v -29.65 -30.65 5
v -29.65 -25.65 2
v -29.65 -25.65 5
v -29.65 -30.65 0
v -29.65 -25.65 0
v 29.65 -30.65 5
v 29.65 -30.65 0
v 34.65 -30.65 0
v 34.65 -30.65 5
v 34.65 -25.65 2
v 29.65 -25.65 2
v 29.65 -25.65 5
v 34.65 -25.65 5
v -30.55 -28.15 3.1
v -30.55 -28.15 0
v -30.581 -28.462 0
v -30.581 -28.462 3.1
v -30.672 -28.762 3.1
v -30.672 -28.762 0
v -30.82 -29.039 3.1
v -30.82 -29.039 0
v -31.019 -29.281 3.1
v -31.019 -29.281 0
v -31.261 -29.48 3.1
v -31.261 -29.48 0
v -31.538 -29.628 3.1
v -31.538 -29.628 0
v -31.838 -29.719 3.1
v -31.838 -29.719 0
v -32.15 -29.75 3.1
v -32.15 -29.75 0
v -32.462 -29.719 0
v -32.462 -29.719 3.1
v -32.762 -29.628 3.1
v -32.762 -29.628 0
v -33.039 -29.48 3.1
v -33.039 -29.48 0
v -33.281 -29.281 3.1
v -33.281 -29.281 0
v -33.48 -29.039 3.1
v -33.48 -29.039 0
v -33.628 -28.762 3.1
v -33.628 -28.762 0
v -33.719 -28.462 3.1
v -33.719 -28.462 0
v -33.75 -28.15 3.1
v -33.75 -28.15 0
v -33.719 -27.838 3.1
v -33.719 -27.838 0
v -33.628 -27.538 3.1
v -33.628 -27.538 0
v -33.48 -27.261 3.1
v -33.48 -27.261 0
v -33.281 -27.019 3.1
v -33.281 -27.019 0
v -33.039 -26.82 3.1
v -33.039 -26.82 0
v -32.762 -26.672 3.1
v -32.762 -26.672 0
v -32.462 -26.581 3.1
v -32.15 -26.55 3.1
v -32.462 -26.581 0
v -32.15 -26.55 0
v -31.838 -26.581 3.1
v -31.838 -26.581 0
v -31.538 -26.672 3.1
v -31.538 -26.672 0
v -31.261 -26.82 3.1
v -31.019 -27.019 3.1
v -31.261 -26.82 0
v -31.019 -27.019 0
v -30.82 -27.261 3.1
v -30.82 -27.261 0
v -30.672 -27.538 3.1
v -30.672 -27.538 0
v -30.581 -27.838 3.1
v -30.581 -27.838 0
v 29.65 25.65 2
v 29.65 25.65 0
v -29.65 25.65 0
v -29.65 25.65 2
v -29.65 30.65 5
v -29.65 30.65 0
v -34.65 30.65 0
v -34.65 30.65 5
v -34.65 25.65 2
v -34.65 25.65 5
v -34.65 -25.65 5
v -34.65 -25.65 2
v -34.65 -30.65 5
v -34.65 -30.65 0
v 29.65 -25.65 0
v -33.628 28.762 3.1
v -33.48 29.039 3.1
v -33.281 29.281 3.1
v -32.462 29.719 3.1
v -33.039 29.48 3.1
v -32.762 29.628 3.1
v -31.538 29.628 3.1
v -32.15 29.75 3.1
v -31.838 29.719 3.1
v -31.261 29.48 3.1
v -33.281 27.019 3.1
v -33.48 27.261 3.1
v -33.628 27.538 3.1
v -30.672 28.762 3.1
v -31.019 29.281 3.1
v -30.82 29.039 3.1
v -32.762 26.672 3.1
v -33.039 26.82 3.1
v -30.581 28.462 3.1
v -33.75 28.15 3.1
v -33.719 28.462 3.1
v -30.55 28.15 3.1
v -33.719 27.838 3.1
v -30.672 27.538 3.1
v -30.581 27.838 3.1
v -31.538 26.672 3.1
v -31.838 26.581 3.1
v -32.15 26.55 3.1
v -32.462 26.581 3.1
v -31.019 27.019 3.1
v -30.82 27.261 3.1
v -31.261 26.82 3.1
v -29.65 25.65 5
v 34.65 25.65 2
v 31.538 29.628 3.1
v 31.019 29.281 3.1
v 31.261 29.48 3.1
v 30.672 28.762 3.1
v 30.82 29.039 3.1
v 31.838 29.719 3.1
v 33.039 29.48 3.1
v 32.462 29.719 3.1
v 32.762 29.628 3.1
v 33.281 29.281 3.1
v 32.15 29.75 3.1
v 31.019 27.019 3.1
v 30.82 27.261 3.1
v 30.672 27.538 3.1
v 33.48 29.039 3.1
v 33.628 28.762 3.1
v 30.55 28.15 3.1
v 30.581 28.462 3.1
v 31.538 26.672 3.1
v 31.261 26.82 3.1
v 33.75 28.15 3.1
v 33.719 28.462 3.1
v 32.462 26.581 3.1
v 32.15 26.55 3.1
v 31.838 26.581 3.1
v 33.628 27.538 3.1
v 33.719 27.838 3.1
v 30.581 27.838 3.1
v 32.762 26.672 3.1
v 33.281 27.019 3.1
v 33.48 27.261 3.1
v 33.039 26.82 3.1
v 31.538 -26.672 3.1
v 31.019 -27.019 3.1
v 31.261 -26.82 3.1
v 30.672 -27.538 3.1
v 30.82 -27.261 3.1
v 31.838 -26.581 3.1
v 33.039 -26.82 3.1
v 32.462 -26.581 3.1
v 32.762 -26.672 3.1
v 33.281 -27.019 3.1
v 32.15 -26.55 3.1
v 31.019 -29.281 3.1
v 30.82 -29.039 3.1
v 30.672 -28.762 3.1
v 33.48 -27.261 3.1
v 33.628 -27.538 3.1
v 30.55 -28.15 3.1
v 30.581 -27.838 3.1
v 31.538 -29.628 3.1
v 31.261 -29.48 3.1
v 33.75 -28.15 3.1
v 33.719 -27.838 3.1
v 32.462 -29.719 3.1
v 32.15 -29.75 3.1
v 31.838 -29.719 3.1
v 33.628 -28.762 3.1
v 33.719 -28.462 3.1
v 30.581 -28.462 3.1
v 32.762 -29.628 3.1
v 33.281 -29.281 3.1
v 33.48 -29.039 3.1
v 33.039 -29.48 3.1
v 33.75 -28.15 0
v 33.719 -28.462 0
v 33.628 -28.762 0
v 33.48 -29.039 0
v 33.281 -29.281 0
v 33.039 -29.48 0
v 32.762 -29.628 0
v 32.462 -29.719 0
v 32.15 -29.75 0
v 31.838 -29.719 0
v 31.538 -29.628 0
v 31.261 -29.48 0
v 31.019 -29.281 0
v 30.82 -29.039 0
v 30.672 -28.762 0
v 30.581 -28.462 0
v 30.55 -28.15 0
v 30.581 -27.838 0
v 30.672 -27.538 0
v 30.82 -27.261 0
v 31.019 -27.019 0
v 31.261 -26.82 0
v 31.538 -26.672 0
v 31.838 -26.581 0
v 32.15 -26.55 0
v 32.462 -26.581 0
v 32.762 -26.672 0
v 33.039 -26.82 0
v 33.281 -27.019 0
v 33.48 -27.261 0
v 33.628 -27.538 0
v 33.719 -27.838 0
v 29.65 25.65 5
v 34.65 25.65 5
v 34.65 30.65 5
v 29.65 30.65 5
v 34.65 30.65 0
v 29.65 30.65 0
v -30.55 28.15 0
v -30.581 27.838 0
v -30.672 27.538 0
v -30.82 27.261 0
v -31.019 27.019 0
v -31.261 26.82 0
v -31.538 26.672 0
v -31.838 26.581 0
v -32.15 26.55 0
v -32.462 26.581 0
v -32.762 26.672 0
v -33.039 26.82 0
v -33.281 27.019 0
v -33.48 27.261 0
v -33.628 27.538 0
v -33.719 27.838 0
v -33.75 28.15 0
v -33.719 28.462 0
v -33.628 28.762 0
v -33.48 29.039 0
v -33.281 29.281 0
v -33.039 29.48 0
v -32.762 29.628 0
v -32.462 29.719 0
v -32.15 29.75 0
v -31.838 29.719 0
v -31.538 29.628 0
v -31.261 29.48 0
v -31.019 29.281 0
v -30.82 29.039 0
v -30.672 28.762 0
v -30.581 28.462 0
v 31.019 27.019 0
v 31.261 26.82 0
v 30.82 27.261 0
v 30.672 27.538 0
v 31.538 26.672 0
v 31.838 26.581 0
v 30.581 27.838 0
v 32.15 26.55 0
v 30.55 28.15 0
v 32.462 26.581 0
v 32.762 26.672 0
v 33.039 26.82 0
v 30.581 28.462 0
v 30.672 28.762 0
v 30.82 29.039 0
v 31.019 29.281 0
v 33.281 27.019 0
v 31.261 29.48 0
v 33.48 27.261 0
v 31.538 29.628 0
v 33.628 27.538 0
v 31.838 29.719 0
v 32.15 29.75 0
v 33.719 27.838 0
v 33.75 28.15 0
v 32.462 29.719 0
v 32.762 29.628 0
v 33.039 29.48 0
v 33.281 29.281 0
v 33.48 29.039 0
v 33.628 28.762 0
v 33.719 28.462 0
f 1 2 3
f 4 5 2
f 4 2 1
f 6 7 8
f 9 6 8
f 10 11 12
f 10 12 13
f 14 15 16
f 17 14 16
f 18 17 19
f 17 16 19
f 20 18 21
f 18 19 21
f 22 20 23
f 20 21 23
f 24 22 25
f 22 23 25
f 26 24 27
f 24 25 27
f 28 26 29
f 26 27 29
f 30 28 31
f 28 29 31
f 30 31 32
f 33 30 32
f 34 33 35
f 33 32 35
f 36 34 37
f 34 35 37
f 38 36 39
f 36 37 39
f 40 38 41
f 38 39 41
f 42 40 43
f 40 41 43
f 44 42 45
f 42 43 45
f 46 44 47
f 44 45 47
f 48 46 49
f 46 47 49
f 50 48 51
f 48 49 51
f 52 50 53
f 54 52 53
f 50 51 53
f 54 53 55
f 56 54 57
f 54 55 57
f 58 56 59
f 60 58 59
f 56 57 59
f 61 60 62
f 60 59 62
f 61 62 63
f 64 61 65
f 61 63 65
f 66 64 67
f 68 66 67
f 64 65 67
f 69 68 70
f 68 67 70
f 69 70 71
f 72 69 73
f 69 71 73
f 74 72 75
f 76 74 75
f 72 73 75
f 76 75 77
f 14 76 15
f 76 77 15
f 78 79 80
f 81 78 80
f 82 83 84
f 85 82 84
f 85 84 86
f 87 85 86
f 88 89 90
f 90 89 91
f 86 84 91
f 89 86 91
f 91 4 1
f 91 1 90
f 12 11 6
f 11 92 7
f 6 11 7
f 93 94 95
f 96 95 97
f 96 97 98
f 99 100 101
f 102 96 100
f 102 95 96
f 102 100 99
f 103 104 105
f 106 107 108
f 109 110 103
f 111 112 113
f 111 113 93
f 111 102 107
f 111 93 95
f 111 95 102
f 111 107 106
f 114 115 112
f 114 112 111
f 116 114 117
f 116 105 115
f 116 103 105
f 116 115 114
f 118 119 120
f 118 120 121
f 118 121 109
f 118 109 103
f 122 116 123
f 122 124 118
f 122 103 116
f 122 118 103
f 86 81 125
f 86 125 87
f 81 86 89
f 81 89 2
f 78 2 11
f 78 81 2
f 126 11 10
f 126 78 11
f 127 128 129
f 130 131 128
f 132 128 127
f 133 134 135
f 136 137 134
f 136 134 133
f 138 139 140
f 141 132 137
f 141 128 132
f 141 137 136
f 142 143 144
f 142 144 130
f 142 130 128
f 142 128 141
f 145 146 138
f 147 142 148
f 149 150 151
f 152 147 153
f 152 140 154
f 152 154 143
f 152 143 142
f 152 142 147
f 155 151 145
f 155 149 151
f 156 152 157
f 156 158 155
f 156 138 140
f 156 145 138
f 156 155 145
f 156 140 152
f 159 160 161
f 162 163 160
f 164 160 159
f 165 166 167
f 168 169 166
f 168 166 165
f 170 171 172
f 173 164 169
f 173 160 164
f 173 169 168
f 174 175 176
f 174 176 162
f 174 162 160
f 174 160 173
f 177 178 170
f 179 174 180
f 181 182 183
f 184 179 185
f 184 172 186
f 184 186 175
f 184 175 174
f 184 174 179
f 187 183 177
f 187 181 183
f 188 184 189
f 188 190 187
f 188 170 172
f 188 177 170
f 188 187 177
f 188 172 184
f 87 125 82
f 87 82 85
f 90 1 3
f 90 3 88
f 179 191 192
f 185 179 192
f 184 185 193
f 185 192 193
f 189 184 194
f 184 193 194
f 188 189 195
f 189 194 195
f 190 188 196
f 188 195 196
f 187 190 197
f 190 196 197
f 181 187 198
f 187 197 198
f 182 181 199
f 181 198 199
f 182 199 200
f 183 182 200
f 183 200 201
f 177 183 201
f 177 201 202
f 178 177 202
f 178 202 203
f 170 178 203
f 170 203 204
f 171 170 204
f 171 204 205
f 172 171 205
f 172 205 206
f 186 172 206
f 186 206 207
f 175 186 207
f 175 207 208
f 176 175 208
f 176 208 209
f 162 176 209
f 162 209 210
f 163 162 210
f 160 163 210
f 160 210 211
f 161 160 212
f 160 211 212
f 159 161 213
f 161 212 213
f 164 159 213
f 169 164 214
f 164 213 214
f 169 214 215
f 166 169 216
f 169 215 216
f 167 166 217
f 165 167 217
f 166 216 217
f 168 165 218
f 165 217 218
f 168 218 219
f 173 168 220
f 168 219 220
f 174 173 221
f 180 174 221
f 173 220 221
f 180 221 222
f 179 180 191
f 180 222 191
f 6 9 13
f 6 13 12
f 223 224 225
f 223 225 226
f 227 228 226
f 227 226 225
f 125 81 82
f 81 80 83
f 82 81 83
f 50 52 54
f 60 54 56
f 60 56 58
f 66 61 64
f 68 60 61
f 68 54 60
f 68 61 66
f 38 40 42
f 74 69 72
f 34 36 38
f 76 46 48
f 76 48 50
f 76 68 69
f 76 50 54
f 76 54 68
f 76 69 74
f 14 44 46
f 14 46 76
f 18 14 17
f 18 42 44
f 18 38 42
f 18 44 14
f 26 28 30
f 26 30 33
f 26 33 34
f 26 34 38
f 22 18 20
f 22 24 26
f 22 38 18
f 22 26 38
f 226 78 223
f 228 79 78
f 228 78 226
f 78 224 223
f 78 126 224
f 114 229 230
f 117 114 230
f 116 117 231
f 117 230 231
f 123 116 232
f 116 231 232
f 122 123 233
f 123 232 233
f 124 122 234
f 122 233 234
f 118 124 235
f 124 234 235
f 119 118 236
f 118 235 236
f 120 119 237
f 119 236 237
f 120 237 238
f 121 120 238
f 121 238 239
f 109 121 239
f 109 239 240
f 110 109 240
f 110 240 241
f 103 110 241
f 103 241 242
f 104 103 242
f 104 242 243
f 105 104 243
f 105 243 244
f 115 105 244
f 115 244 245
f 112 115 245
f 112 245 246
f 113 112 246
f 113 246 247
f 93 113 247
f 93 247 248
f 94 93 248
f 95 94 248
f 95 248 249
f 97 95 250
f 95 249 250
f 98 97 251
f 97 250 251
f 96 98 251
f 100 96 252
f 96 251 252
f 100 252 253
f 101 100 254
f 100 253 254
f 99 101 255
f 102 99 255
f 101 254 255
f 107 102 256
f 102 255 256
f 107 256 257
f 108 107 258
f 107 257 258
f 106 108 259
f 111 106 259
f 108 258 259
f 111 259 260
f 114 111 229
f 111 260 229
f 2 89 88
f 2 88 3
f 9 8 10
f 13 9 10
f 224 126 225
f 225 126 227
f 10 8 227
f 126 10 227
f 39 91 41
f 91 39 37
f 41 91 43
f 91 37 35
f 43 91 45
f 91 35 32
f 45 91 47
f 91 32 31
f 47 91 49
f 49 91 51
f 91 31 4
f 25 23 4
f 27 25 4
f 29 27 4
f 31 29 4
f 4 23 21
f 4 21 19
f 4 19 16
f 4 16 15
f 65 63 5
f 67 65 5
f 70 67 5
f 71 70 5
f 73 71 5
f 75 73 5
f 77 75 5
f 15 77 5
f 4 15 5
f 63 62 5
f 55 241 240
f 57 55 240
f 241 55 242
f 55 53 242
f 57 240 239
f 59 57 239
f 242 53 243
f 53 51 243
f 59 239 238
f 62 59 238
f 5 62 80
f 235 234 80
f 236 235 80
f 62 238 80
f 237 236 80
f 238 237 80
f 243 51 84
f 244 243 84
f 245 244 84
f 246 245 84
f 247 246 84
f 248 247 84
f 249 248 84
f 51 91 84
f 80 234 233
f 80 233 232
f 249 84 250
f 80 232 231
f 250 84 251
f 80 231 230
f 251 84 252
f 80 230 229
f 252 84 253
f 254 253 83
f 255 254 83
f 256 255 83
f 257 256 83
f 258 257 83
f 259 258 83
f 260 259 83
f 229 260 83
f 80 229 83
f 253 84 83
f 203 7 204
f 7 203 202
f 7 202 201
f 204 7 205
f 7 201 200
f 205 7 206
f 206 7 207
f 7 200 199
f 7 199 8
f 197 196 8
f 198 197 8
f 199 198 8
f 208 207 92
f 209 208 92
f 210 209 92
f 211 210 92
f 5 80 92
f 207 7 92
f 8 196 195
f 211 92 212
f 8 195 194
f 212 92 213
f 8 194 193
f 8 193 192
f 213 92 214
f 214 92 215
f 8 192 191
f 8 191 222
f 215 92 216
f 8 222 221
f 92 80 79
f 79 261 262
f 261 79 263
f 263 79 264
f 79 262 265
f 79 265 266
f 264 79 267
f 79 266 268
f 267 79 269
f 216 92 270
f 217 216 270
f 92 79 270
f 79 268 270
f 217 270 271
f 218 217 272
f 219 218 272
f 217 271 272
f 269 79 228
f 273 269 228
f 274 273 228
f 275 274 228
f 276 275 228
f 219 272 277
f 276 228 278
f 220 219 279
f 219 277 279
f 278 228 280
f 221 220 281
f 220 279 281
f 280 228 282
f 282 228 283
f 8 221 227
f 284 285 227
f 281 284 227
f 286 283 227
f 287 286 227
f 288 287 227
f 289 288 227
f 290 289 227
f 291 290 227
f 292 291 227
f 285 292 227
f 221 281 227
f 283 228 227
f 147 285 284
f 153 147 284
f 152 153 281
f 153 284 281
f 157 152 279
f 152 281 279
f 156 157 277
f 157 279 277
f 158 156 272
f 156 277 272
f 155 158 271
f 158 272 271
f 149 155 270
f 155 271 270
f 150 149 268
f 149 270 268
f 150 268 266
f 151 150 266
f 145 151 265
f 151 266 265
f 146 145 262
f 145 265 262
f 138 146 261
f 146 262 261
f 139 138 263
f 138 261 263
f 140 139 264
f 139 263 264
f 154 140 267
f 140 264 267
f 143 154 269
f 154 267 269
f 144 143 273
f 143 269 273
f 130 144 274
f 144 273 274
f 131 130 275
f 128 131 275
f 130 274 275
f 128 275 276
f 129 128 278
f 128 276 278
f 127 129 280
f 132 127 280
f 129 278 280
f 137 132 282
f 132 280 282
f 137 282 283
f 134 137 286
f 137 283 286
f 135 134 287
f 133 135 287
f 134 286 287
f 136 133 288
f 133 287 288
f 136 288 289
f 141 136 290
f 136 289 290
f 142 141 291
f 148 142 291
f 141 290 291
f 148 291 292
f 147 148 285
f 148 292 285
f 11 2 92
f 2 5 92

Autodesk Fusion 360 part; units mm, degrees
sketch "Sketch1" plane through (0, 0, 0) normal (0, 0, 1) x (1, 0, 0)
  line L0 (34.65, 25.65) -> (-34.65, 25.65)
  line L1 (-34.65, 25.65) -> (-34.65, -25.65)
  line L2 (-34.65, -25.65) -> (34.65, -25.65)
  line L3 (34.65, -25.65) -> (34.65, 25.65)
  line L4 (34.65, 25.65) -> (-34.65, -25.65) construction
  line L5 (-34.65, 25.65) -> (34.65, -25.65) construction
  dimension "d1" = 69.3
  dimension "d2" = 51.3
extrude "Extrude1" add sketch "Sketch1" along normal blind 2
sketch "Sketch2" plane through (0, 0, 2) normal (0, 0, 1) x (-1, 0, 0)
  line L0 (-34.65, 25.65) -> (-34.65, -25.65)
  line L1 (-34.65, -25.65) -> (34.65, -25.65)
  line L2 (34.65, -25.65) -> (34.65, 25.65)
  line L3 (34.65, 25.65) -> (-34.65, 25.65)
  line L4 (34.65, -25.65) -> (29.65, -25.65)
  line L5 (29.65, -25.65) -> (29.65, -30.65)
  line L6 (29.65, -30.65) -> (34.65, -30.65)
  line L7 (34.65, -30.65) -> (34.65, -25.65)
  line L8 (-34.65, -25.65) -> (-29.65, -25.65)
  line L9 (-29.65, -25.65) -> (-29.65, -30.65)
  line L10 (-29.65, -30.65) -> (-34.65, -30.65)
  line L11 (-34.65, -30.65) -> (-34.65, -25.65)
  line L12 (34.65, 25.65) -> (29.65, 25.65)
  line L13 (29.65, 25.65) -> (29.65, 30.65)
  line L14 (29.65, 30.65) -> (34.65, 30.65)
  line L15 (34.65, 30.65) -> (34.65, 25.65)
  line L16 (-34.65, 25.65) -> (-29.65, 25.65)
  line L17 (-29.65, 25.65) -> (-29.65, 30.65)
  line L18 (-29.65, 30.65) -> (-34.65, 30.65)
  line L19 (-34.65, 30.65) -> (-34.65, 25.65)
  dimension "d5" = 5
  dimension "d6" = 5
  dimension "d7" = 5
  dimension "d8" = 5
  dimension "d9" = 5
  dimension "d10" = 5
  dimension "d11" = 5
  dimension "d12" = 5
extrude "Extrude2" add sketch "Sketch2" along normal blind 5 from surface at -2 contours L3 L16 L17 L18 L19 | L1 L8 L9 L10 L11 | L3 L12 L13 L14 L15 | L1 L4 L5 L6 L7
sketch "Sketch3" plane through (0, 0, 0) normal (0, 0, -1) x (1, 0, 0)
  line L0 (34.65, -30.65) -> (34.65, 30.65)
  line L1 (34.65, 30.65) -> (29.65, 30.65)
  line L2 (29.65, 30.65) -> (29.65, 25.65)
  line L3 (29.65, 25.65) -> (-29.65, 25.65)
  line L4 (-29.65, 25.65) -> (-29.65, 30.65)
  line L5 (-29.65, 30.65) -> (-34.65, 30.65)
  line L6 (-34.65, 30.65) -> (-34.65, -30.65)
  line L7 (-34.65, -30.65) -> (-29.65, -30.65)
  line L8 (-29.65, -30.65) -> (-29.65, -25.65)
  line L9 (-29.65, -25.65) -> (29.65, -25.65)
  line L10 (29.65, -25.65) -> (29.65, -30.65)
  line L11 (29.65, -30.65) -> (34.65, -30.65)
  circle A0 centre (-32.15, 28.15) radius 1.6
  circle A1 centre (32.15, 28.15) radius 1.6
  circle A2 centre (32.15, -28.15) radius 1.6
  circle A3 centre (-32.15, -28.15) radius 1.6
  dimension "d16" = 3.2
  dimension "d17" = 3.2
  dimension "d18" = 3.2
  dimension "d19" = 3.2
  dimension "d20" = 2.5
  dimension "d21" = 2.5
  dimension "d22" = 2.5
  dimension "d23" = 2.5
  dimension "d24" = 2.5
  dimension "d25" = 2.5
  dimension "d26" = 2.5
  dimension "d27" = 2.5
extrude "Extrude3" cut sketch "Sketch3" against normal blind 3.1 contours A0 | A1 | A2 | A3
